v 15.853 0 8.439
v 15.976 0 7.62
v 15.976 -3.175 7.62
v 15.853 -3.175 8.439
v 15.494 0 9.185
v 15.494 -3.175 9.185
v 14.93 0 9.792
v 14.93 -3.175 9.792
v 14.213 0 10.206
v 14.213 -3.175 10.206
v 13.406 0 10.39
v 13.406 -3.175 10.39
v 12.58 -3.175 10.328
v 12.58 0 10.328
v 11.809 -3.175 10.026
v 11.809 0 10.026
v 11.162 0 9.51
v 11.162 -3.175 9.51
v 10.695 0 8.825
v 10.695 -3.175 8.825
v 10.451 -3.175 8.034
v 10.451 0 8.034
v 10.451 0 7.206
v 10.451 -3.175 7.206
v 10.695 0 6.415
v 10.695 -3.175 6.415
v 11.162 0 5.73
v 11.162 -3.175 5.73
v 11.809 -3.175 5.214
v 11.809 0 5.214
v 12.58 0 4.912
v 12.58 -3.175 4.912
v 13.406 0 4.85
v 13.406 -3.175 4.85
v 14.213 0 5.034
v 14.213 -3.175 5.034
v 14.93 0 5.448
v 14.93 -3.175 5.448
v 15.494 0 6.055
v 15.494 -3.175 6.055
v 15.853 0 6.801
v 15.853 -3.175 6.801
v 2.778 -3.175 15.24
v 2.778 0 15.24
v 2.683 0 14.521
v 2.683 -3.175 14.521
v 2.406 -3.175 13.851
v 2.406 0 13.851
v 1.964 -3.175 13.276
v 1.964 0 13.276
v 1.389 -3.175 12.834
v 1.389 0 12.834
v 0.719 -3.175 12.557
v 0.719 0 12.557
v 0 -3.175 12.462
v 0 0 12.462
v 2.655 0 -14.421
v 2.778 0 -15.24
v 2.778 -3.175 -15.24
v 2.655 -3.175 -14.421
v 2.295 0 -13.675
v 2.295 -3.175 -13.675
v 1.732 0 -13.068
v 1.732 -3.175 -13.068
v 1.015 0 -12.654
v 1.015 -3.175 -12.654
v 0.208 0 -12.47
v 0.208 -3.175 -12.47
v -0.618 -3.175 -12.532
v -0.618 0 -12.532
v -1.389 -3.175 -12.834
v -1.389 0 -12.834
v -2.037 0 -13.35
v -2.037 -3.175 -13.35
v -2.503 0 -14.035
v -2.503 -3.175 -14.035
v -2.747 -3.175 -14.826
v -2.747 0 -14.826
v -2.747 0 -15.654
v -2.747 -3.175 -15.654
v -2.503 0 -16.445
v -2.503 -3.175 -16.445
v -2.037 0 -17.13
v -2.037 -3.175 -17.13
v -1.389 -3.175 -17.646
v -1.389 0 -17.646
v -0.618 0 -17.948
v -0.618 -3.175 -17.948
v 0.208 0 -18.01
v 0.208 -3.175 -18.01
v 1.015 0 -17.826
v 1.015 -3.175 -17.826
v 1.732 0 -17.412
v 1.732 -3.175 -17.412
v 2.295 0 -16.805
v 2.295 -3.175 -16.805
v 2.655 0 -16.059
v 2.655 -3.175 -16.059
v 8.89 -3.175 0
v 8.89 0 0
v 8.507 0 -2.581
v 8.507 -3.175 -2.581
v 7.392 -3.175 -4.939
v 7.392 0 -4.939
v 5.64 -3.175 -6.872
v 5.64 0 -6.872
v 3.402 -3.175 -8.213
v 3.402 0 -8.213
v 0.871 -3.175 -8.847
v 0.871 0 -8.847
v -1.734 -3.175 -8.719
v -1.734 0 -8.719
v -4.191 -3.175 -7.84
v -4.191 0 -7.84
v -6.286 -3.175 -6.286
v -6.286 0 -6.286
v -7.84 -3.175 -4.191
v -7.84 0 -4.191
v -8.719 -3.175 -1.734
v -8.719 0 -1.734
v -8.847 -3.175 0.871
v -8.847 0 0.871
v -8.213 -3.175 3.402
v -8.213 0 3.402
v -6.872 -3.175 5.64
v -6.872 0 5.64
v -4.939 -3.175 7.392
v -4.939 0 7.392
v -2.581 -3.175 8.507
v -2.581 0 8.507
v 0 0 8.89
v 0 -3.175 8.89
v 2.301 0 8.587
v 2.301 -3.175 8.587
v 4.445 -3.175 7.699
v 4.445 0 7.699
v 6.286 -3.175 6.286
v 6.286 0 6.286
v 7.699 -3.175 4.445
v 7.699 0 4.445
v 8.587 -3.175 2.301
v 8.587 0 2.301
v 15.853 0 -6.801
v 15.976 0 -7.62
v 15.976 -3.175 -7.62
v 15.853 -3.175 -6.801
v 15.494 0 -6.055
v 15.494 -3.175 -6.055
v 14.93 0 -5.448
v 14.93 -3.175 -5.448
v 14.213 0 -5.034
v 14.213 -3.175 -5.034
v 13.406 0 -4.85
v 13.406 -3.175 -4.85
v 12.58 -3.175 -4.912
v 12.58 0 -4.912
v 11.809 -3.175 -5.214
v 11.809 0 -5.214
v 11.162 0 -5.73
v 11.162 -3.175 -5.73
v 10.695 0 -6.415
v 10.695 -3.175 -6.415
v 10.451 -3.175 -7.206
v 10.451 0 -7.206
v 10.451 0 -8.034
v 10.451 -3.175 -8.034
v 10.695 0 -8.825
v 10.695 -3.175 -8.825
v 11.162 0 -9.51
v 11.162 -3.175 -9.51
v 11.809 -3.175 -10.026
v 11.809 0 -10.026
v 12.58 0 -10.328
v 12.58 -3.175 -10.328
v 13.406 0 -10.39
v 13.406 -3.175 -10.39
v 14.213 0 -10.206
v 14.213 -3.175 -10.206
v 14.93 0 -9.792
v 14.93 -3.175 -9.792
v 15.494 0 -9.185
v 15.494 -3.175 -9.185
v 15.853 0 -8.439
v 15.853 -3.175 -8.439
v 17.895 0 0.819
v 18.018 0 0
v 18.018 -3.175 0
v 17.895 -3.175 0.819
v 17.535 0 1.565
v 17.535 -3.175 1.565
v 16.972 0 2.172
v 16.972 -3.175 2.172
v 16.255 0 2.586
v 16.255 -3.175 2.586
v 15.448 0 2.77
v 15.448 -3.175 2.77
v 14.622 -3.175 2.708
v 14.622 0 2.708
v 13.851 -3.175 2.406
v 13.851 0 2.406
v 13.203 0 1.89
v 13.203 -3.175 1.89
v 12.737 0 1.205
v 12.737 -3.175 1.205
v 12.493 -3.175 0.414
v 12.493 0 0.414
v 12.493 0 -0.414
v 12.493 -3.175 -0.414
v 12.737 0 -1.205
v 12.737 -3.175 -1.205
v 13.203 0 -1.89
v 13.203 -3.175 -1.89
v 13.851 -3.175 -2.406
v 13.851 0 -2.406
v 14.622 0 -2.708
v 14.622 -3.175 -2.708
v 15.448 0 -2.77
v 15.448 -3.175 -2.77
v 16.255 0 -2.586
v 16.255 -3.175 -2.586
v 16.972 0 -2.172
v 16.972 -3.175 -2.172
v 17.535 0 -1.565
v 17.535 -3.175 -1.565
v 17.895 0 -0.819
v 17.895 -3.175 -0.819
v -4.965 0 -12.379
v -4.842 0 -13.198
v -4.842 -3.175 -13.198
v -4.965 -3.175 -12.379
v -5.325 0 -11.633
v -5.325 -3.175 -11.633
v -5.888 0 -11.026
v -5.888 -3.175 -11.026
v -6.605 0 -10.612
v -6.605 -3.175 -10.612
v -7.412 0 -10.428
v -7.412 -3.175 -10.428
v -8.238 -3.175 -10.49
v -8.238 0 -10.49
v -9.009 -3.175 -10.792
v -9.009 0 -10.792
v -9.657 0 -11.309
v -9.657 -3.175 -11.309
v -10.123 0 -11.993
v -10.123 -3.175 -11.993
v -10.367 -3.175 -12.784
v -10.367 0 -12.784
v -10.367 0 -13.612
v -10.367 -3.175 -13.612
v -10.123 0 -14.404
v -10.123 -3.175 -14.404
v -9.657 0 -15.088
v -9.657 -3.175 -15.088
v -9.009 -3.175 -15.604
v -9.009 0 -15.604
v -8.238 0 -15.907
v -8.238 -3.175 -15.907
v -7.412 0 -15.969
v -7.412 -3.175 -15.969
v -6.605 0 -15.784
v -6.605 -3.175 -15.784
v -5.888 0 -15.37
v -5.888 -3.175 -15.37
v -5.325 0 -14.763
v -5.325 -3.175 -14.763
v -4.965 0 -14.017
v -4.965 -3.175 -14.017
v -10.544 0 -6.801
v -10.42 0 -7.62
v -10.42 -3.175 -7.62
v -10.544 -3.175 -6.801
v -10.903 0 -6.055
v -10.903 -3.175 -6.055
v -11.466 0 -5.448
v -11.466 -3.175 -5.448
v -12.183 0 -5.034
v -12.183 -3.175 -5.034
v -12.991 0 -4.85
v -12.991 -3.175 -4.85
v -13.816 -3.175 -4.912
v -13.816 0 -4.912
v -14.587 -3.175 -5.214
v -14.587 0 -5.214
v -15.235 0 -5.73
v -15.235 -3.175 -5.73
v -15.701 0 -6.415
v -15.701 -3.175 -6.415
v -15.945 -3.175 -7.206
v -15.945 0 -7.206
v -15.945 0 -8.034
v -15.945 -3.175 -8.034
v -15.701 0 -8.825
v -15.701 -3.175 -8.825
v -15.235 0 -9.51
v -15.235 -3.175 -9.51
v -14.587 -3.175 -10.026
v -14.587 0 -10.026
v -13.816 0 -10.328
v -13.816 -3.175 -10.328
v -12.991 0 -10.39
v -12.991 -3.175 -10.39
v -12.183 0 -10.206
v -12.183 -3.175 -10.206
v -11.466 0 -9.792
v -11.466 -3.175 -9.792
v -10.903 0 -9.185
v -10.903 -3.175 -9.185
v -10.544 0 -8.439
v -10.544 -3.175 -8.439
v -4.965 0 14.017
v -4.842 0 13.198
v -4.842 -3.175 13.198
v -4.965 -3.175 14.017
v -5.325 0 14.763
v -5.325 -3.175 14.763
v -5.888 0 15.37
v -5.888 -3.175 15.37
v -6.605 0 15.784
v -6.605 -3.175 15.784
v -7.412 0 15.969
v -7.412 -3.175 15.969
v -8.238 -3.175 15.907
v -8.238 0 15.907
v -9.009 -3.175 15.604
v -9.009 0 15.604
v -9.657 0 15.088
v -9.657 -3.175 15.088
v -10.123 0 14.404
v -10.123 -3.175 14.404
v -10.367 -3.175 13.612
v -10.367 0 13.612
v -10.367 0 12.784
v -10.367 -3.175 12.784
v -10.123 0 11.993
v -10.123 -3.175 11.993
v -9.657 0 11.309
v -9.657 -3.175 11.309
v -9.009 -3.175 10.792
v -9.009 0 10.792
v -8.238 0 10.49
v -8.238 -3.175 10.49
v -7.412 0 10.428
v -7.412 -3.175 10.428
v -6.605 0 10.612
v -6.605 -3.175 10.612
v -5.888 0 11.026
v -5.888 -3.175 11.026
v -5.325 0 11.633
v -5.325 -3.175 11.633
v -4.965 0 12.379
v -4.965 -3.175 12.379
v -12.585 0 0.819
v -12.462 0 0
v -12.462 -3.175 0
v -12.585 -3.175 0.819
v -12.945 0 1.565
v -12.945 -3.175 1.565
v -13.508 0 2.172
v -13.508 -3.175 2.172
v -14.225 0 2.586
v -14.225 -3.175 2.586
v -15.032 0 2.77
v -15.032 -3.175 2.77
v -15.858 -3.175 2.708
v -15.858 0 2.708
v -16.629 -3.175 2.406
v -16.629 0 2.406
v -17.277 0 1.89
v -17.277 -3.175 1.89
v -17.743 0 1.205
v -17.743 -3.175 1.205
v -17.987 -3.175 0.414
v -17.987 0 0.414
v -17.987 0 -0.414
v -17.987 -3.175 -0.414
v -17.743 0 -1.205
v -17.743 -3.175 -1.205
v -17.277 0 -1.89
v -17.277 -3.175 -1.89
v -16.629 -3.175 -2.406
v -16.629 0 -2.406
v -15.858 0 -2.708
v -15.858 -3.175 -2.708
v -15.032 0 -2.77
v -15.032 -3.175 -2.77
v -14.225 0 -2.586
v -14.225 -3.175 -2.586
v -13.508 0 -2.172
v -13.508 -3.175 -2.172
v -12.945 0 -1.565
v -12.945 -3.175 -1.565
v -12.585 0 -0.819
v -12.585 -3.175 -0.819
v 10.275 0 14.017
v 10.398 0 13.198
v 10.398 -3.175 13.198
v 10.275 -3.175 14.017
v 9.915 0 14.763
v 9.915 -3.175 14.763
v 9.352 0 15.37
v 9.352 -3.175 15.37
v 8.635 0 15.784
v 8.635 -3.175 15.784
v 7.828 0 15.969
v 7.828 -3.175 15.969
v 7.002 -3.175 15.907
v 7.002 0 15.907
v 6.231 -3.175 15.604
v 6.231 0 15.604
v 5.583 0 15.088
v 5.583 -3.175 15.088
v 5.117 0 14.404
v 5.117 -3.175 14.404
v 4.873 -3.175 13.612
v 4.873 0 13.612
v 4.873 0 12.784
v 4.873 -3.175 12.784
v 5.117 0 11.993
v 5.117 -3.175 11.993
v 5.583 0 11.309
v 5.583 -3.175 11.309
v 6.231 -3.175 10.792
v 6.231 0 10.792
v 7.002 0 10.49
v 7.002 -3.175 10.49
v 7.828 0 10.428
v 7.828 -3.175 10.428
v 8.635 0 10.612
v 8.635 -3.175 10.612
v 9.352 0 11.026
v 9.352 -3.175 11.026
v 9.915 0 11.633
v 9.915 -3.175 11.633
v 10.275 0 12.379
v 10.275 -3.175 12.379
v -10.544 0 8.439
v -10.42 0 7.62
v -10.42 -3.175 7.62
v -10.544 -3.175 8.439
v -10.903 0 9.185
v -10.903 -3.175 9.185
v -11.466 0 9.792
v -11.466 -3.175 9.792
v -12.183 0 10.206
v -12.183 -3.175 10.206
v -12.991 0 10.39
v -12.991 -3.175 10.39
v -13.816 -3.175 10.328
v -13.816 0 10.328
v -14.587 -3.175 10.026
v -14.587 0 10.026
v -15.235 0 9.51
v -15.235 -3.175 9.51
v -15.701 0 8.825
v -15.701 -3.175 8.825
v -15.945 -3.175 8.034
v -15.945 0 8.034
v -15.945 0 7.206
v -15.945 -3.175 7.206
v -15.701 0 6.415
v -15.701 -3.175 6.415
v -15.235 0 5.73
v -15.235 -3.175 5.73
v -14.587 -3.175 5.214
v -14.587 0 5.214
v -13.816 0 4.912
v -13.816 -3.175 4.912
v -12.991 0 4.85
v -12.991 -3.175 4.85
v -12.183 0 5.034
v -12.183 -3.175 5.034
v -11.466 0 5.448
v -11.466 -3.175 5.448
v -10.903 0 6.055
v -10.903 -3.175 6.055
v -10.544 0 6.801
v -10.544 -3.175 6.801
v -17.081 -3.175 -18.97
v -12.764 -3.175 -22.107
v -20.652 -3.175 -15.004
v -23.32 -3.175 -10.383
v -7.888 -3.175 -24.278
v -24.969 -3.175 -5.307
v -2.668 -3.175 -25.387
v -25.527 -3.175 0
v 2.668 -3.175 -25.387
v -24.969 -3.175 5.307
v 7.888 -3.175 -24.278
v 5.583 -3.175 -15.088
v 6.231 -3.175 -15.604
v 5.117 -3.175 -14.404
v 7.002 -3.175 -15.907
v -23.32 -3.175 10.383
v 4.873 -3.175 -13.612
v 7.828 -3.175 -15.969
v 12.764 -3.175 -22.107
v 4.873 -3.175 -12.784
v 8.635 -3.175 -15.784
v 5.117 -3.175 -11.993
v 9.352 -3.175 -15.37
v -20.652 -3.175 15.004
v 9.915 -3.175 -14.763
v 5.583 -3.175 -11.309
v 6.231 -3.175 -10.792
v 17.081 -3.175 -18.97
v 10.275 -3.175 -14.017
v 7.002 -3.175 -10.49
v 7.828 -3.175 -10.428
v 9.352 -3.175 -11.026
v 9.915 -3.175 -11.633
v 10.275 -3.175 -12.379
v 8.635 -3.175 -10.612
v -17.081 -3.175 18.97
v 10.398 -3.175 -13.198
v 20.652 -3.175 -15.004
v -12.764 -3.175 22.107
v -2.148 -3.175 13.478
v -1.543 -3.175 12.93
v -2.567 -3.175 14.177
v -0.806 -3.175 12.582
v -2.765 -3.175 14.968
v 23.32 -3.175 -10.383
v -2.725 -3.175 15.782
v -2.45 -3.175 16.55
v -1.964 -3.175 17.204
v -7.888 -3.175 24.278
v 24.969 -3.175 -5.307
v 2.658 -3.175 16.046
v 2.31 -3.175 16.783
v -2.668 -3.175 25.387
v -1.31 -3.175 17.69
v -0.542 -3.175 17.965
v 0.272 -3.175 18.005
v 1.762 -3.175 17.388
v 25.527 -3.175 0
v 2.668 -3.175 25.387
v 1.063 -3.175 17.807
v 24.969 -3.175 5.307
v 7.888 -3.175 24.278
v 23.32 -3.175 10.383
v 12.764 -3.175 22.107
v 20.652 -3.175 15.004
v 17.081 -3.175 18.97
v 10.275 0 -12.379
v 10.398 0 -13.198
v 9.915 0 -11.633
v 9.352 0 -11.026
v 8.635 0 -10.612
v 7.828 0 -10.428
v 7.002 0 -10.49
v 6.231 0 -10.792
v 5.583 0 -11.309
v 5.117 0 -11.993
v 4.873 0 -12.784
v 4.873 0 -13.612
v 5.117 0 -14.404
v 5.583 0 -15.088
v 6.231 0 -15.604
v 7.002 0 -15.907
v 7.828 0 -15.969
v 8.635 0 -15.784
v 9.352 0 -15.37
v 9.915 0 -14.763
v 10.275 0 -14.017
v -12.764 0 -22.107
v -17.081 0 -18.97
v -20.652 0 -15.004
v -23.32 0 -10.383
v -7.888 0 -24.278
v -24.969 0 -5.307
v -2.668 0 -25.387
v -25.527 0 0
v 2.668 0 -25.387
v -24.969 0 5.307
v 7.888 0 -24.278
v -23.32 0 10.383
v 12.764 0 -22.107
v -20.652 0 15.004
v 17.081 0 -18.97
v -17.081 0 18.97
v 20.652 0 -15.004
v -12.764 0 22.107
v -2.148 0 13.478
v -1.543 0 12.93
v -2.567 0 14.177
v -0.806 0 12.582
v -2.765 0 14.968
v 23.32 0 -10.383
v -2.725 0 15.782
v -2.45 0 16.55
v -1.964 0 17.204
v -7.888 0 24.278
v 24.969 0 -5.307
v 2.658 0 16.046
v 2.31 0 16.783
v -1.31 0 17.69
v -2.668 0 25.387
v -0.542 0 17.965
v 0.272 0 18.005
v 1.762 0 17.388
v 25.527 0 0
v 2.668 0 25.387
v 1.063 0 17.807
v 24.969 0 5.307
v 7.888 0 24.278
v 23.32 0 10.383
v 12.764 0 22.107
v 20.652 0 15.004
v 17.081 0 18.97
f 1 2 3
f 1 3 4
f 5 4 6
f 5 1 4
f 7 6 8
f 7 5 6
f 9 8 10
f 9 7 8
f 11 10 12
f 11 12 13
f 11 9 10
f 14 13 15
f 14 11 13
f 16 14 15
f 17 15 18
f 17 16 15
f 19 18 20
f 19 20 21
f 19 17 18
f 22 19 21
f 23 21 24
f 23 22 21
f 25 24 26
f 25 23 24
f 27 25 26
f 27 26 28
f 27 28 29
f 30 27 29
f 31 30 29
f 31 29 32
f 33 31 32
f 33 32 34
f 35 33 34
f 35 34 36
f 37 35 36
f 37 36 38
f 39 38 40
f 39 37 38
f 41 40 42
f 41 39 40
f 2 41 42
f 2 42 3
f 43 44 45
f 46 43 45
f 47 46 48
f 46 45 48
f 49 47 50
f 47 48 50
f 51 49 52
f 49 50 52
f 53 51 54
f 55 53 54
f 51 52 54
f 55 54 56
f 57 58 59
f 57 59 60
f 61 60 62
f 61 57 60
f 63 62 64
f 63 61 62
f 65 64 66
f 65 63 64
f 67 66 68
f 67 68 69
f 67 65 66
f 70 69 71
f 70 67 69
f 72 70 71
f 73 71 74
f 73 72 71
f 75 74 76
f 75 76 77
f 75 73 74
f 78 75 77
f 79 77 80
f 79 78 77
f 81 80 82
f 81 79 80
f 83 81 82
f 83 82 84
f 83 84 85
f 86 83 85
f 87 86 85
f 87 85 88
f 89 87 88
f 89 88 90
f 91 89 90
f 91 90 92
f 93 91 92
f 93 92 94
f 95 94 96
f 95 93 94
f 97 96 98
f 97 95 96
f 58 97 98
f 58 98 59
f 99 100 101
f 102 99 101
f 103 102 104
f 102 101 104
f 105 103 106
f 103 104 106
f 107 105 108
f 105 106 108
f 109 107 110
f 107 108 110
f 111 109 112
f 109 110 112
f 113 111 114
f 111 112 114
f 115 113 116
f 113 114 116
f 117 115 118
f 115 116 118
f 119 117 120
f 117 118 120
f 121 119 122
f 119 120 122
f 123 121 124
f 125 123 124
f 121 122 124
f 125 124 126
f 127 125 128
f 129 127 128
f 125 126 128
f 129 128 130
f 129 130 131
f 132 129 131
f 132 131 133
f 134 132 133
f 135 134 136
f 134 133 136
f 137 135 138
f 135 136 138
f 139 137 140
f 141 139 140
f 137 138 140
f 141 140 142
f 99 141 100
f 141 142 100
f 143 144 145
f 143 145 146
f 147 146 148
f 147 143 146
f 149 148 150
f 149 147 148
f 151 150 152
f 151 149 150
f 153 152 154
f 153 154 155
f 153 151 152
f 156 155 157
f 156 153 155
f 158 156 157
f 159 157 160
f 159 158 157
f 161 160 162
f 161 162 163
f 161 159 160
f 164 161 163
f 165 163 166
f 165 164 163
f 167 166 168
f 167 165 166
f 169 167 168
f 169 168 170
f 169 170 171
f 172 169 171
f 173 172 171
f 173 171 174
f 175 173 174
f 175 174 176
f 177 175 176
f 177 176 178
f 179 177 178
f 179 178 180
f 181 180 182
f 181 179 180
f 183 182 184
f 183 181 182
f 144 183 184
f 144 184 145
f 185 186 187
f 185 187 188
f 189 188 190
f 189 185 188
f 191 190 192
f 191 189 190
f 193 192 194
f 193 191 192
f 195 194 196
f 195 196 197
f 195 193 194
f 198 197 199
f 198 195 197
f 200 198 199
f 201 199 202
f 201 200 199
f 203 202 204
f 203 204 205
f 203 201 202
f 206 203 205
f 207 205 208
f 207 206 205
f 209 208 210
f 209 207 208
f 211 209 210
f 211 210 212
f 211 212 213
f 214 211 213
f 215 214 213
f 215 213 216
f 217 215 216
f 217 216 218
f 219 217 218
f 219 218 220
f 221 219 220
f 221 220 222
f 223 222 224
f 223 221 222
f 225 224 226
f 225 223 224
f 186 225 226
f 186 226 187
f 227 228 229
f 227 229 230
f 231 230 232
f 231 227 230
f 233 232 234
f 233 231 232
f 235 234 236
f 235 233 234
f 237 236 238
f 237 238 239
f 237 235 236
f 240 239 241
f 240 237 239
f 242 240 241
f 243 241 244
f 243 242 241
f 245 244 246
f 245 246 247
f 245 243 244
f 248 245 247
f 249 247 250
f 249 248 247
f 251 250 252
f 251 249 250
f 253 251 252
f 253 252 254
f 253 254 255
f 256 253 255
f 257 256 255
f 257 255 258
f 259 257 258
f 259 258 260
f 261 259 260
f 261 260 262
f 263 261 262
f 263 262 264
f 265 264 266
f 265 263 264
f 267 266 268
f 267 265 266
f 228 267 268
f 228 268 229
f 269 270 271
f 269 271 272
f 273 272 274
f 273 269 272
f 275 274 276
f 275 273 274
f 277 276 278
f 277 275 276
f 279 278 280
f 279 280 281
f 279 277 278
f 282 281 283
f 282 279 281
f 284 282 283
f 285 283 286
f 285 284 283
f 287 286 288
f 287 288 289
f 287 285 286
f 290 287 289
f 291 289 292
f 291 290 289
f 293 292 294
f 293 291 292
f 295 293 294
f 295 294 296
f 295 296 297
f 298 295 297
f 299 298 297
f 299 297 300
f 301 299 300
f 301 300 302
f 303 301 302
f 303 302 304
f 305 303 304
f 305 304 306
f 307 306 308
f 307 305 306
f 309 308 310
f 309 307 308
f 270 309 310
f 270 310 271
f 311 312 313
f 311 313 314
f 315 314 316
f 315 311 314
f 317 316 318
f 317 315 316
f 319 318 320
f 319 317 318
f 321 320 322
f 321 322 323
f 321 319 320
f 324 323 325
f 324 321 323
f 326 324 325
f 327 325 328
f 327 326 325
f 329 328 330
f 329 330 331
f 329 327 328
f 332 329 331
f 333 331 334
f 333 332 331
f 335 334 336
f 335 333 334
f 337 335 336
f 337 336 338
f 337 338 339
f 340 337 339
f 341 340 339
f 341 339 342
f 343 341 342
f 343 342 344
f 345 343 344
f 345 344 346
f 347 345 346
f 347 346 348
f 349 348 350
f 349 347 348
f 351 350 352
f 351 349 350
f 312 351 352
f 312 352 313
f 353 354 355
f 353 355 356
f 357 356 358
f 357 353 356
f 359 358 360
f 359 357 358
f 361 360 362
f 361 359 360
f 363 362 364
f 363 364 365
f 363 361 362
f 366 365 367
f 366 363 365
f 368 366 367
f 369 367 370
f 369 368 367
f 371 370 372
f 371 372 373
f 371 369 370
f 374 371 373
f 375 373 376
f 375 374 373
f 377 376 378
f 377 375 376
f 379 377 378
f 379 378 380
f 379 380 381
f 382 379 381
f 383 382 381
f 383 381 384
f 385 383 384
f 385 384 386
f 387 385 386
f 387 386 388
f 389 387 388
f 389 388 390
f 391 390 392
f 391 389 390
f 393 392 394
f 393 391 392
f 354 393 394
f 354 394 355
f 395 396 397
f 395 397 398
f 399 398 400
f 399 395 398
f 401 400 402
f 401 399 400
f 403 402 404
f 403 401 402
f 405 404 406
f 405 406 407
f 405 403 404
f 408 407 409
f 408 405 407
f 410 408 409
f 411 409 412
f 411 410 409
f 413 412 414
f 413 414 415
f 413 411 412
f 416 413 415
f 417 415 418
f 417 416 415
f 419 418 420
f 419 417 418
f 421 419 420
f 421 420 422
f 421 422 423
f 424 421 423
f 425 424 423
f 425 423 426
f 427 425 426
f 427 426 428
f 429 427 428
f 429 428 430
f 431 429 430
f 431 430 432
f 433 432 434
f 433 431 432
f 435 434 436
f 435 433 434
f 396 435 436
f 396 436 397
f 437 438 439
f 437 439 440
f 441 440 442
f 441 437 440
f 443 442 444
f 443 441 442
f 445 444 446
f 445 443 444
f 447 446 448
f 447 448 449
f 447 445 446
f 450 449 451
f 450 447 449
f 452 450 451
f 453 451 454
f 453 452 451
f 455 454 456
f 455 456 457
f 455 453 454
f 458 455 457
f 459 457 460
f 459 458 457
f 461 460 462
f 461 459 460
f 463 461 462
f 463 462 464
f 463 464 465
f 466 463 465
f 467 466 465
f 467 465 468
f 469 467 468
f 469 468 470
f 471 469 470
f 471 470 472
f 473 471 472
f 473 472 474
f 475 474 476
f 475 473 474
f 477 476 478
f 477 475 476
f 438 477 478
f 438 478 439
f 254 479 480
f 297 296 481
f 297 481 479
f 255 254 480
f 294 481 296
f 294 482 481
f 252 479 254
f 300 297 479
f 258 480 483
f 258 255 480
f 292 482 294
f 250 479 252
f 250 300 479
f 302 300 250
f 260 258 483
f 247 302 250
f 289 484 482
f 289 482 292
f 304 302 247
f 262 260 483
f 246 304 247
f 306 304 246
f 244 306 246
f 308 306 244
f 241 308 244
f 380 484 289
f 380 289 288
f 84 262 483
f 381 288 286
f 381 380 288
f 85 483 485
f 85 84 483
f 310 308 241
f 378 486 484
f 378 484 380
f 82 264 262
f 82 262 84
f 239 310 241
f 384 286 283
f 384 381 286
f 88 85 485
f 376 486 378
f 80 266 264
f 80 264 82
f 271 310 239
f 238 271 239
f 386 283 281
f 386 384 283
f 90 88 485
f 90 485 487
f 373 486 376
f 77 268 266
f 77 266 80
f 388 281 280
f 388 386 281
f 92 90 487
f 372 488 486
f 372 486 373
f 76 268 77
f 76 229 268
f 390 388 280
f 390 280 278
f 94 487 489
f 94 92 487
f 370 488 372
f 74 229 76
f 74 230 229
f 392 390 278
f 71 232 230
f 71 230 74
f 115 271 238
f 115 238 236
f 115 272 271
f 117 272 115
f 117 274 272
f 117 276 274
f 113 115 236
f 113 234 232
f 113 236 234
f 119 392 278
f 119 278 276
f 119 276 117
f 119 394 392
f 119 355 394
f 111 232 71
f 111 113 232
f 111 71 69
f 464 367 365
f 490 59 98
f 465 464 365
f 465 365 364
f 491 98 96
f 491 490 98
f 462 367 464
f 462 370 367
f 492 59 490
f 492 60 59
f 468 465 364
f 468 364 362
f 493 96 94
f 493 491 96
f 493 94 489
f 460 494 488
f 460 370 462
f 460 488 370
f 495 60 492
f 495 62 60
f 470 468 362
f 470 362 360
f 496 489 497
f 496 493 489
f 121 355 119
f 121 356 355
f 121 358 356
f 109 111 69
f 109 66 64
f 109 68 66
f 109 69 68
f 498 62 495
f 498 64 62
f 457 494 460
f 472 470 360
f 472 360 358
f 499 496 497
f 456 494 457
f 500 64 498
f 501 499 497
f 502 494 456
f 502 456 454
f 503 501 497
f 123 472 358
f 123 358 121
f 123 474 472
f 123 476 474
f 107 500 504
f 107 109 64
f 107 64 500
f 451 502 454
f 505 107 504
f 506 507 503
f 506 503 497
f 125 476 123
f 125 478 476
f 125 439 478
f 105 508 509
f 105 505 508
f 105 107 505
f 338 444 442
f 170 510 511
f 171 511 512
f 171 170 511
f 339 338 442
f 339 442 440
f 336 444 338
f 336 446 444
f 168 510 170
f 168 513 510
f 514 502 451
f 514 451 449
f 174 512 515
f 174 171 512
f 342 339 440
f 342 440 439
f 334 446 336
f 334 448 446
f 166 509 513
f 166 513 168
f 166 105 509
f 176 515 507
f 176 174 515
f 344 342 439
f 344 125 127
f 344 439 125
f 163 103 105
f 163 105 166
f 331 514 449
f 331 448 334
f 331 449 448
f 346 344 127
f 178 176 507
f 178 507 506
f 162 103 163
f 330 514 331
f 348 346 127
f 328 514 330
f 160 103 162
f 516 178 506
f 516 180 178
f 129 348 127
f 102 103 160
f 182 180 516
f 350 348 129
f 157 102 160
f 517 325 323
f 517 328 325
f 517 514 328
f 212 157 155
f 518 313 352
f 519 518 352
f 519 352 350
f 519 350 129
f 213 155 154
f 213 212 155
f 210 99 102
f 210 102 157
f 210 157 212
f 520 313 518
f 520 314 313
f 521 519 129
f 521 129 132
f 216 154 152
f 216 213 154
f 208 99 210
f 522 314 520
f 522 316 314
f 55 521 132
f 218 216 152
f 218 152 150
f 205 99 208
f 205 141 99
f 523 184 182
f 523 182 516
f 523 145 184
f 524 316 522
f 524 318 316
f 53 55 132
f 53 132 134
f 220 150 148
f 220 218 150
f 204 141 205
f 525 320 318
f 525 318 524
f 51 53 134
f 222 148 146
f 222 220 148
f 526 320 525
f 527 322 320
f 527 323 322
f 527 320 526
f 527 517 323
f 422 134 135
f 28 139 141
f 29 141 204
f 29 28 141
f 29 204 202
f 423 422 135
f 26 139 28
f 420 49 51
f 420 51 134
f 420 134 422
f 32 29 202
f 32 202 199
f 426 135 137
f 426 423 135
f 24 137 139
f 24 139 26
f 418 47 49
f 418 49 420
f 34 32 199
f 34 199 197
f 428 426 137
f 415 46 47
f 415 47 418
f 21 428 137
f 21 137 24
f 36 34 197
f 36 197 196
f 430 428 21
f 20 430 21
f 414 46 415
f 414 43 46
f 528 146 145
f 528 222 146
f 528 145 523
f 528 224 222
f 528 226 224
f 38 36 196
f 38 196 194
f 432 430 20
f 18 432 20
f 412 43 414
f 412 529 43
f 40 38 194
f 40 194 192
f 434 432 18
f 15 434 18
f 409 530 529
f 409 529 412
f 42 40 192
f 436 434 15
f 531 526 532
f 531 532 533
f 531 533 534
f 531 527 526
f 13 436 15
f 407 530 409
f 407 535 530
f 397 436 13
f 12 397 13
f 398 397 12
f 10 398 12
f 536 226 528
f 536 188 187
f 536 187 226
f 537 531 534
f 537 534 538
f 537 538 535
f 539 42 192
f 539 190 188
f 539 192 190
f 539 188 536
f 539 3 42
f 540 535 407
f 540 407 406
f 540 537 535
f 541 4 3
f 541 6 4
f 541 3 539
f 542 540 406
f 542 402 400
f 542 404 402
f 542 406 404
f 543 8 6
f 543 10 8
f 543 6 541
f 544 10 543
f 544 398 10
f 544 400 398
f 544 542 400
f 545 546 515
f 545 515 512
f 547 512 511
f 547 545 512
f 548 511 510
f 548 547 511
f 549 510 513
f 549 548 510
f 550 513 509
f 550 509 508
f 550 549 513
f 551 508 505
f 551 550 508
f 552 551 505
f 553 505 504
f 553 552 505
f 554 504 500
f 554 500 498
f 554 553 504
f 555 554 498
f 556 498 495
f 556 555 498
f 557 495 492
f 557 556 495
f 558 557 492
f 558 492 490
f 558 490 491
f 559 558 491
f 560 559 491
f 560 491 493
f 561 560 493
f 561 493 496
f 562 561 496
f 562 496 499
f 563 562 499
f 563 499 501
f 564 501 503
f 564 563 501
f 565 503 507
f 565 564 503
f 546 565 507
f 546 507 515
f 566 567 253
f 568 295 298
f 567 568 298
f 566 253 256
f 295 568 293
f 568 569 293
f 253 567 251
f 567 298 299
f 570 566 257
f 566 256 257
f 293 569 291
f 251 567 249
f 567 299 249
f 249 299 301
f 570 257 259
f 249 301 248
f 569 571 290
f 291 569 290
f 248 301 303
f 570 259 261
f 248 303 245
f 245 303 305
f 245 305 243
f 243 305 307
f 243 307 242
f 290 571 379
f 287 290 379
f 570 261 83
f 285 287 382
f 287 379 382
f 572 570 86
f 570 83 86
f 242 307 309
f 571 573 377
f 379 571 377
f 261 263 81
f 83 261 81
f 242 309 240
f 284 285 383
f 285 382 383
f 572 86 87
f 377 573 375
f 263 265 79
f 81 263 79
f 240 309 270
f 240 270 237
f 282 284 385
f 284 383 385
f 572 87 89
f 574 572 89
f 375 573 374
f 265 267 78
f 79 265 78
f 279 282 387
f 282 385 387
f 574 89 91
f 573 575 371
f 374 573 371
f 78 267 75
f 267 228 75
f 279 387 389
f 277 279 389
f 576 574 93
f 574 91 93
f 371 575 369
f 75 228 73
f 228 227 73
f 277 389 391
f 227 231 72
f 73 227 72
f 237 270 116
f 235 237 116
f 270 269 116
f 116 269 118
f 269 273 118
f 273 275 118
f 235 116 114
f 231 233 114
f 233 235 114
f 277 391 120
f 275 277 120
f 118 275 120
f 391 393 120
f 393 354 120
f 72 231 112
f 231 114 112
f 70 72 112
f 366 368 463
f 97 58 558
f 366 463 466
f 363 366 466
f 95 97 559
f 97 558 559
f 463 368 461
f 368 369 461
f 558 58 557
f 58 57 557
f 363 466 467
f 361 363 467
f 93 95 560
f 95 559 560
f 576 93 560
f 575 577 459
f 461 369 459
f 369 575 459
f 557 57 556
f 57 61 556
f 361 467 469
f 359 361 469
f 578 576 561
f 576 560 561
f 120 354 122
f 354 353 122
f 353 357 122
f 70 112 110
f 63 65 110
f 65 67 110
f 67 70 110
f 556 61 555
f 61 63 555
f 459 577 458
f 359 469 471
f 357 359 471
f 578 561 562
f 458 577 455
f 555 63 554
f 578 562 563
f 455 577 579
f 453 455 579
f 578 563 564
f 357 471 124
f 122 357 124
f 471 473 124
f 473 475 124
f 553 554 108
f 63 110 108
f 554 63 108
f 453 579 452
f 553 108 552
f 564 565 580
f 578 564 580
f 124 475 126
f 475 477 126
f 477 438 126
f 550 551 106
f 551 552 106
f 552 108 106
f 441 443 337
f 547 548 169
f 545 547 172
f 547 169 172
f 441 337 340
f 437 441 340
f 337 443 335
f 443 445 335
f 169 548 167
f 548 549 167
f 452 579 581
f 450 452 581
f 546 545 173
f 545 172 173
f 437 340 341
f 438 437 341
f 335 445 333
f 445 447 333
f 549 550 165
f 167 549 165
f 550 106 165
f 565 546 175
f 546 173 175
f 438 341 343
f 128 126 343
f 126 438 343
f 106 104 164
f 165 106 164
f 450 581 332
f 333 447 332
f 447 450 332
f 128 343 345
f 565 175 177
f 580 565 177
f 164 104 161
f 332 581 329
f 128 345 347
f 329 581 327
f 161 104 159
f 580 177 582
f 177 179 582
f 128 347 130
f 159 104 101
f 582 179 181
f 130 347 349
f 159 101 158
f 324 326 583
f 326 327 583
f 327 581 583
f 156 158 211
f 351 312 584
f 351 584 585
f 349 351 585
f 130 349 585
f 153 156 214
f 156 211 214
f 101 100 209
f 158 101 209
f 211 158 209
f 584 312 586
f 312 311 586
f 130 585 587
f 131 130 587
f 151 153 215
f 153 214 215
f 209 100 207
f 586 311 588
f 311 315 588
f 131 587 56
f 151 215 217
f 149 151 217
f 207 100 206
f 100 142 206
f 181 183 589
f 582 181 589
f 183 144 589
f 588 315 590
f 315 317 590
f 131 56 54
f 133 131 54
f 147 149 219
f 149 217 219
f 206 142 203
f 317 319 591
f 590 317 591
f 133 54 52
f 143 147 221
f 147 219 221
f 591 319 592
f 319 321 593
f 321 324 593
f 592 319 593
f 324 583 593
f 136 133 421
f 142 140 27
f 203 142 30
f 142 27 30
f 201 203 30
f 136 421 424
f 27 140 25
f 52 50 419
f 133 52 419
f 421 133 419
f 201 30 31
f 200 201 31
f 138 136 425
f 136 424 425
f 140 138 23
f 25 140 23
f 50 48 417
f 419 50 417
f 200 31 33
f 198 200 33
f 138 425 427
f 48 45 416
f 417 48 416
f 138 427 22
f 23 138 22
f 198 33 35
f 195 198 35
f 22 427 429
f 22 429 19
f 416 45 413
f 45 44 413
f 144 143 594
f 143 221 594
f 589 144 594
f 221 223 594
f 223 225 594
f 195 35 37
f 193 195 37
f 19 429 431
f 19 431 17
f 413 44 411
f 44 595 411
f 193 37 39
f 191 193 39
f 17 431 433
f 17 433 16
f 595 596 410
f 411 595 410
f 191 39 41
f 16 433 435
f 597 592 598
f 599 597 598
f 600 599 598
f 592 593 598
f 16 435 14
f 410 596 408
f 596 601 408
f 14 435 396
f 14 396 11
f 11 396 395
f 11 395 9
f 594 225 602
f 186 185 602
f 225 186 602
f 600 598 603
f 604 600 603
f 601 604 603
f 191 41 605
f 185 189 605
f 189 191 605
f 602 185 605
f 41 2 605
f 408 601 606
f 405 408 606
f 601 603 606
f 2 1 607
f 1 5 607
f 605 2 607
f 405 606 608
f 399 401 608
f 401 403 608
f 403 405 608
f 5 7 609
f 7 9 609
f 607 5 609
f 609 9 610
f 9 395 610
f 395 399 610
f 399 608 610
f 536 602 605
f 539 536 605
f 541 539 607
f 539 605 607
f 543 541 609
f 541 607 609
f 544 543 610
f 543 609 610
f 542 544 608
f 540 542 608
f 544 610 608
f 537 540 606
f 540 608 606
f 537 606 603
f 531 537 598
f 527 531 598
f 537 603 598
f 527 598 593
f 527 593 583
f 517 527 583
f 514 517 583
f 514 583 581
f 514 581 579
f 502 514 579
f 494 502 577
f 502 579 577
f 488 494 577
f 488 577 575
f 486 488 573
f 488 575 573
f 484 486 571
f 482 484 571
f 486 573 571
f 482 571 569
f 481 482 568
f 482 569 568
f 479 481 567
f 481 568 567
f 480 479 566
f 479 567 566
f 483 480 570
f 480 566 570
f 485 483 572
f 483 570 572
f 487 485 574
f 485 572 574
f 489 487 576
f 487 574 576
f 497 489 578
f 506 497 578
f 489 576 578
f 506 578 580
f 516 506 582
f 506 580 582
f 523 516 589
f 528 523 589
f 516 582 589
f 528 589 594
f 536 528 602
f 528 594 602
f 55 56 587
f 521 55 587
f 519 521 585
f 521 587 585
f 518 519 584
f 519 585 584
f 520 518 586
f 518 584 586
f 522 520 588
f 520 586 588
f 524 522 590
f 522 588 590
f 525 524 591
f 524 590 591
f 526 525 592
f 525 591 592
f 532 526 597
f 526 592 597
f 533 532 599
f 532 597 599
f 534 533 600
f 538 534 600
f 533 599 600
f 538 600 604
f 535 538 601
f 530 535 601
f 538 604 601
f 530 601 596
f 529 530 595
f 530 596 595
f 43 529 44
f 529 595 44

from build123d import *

# Parameters (mm, degrees)
F0_R     = 25.527
F0_R_2   = 2.778125
F1_DEPTH = 3.175


with BuildPart() as f1:
    # F0 (on Front) → F1 (new body)
    with BuildSketch(Plane.XZ):
        Circle(F0_R)
        with Locations((-7.62, -13.1982271537)):
            Circle(F0_R_2, mode=Mode.SUBTRACT)
        with Locations((-13.1982271537, -7.62)):
            Circle(F0_R_2, mode=Mode.SUBTRACT)
        with Locations((0, -15.24)):
            Circle(F0_R_2, mode=Mode.SUBTRACT)
        with Locations((7.62, -13.1982271537)):
            Circle(F0_R_2, mode=Mode.SUBTRACT)
        with Locations((13.1982271537, -7.62)):
            Circle(F0_R_2, mode=Mode.SUBTRACT)
        with Locations((-15.24, 0)):
            Circle(F0_R_2, mode=Mode.SUBTRACT)
        with Locations((-13.1982271537, 7.62)):
            Circle(F0_R_2, mode=Mode.SUBTRACT)
        with Locations((-7.62, 13.1982271537)):
            Circle(F0_R_2, mode=Mode.SUBTRACT)
        with BuildLine():
            ThreePointArc((8.89, 0), (-6.2861792847, -6.2861792847), (0, 8.89))
            ThreePointArc((0, 8.89), (6.2861792847, 6.2861792847), (8.89, 0))
        make_face(mode=Mode.SUBTRACT)
        with Locations((15.24, 0)):
            Circle(F0_R_2, mode=Mode.SUBTRACT)
        with Locations((13.1982271537, 7.62)):
            Circle(F0_R_2, mode=Mode.SUBTRACT)
        with BuildLine():
            ThreePointArc((0, 12.461875), (-1.9644310265, 17.2044310265), (2.778125, 15.24))
            ThreePointArc((2.778125, 15.24), (1.9644310265, 13.2755689735), (0, 12.461875))
        make_face(mode=Mode.SUBTRACT)
        with Locations((7.62, 13.1982271537)):
            Circle(F0_R_2, mode=Mode.SUBTRACT)
    extrude(amount=F1_DEPTH)


solid = f1.part
